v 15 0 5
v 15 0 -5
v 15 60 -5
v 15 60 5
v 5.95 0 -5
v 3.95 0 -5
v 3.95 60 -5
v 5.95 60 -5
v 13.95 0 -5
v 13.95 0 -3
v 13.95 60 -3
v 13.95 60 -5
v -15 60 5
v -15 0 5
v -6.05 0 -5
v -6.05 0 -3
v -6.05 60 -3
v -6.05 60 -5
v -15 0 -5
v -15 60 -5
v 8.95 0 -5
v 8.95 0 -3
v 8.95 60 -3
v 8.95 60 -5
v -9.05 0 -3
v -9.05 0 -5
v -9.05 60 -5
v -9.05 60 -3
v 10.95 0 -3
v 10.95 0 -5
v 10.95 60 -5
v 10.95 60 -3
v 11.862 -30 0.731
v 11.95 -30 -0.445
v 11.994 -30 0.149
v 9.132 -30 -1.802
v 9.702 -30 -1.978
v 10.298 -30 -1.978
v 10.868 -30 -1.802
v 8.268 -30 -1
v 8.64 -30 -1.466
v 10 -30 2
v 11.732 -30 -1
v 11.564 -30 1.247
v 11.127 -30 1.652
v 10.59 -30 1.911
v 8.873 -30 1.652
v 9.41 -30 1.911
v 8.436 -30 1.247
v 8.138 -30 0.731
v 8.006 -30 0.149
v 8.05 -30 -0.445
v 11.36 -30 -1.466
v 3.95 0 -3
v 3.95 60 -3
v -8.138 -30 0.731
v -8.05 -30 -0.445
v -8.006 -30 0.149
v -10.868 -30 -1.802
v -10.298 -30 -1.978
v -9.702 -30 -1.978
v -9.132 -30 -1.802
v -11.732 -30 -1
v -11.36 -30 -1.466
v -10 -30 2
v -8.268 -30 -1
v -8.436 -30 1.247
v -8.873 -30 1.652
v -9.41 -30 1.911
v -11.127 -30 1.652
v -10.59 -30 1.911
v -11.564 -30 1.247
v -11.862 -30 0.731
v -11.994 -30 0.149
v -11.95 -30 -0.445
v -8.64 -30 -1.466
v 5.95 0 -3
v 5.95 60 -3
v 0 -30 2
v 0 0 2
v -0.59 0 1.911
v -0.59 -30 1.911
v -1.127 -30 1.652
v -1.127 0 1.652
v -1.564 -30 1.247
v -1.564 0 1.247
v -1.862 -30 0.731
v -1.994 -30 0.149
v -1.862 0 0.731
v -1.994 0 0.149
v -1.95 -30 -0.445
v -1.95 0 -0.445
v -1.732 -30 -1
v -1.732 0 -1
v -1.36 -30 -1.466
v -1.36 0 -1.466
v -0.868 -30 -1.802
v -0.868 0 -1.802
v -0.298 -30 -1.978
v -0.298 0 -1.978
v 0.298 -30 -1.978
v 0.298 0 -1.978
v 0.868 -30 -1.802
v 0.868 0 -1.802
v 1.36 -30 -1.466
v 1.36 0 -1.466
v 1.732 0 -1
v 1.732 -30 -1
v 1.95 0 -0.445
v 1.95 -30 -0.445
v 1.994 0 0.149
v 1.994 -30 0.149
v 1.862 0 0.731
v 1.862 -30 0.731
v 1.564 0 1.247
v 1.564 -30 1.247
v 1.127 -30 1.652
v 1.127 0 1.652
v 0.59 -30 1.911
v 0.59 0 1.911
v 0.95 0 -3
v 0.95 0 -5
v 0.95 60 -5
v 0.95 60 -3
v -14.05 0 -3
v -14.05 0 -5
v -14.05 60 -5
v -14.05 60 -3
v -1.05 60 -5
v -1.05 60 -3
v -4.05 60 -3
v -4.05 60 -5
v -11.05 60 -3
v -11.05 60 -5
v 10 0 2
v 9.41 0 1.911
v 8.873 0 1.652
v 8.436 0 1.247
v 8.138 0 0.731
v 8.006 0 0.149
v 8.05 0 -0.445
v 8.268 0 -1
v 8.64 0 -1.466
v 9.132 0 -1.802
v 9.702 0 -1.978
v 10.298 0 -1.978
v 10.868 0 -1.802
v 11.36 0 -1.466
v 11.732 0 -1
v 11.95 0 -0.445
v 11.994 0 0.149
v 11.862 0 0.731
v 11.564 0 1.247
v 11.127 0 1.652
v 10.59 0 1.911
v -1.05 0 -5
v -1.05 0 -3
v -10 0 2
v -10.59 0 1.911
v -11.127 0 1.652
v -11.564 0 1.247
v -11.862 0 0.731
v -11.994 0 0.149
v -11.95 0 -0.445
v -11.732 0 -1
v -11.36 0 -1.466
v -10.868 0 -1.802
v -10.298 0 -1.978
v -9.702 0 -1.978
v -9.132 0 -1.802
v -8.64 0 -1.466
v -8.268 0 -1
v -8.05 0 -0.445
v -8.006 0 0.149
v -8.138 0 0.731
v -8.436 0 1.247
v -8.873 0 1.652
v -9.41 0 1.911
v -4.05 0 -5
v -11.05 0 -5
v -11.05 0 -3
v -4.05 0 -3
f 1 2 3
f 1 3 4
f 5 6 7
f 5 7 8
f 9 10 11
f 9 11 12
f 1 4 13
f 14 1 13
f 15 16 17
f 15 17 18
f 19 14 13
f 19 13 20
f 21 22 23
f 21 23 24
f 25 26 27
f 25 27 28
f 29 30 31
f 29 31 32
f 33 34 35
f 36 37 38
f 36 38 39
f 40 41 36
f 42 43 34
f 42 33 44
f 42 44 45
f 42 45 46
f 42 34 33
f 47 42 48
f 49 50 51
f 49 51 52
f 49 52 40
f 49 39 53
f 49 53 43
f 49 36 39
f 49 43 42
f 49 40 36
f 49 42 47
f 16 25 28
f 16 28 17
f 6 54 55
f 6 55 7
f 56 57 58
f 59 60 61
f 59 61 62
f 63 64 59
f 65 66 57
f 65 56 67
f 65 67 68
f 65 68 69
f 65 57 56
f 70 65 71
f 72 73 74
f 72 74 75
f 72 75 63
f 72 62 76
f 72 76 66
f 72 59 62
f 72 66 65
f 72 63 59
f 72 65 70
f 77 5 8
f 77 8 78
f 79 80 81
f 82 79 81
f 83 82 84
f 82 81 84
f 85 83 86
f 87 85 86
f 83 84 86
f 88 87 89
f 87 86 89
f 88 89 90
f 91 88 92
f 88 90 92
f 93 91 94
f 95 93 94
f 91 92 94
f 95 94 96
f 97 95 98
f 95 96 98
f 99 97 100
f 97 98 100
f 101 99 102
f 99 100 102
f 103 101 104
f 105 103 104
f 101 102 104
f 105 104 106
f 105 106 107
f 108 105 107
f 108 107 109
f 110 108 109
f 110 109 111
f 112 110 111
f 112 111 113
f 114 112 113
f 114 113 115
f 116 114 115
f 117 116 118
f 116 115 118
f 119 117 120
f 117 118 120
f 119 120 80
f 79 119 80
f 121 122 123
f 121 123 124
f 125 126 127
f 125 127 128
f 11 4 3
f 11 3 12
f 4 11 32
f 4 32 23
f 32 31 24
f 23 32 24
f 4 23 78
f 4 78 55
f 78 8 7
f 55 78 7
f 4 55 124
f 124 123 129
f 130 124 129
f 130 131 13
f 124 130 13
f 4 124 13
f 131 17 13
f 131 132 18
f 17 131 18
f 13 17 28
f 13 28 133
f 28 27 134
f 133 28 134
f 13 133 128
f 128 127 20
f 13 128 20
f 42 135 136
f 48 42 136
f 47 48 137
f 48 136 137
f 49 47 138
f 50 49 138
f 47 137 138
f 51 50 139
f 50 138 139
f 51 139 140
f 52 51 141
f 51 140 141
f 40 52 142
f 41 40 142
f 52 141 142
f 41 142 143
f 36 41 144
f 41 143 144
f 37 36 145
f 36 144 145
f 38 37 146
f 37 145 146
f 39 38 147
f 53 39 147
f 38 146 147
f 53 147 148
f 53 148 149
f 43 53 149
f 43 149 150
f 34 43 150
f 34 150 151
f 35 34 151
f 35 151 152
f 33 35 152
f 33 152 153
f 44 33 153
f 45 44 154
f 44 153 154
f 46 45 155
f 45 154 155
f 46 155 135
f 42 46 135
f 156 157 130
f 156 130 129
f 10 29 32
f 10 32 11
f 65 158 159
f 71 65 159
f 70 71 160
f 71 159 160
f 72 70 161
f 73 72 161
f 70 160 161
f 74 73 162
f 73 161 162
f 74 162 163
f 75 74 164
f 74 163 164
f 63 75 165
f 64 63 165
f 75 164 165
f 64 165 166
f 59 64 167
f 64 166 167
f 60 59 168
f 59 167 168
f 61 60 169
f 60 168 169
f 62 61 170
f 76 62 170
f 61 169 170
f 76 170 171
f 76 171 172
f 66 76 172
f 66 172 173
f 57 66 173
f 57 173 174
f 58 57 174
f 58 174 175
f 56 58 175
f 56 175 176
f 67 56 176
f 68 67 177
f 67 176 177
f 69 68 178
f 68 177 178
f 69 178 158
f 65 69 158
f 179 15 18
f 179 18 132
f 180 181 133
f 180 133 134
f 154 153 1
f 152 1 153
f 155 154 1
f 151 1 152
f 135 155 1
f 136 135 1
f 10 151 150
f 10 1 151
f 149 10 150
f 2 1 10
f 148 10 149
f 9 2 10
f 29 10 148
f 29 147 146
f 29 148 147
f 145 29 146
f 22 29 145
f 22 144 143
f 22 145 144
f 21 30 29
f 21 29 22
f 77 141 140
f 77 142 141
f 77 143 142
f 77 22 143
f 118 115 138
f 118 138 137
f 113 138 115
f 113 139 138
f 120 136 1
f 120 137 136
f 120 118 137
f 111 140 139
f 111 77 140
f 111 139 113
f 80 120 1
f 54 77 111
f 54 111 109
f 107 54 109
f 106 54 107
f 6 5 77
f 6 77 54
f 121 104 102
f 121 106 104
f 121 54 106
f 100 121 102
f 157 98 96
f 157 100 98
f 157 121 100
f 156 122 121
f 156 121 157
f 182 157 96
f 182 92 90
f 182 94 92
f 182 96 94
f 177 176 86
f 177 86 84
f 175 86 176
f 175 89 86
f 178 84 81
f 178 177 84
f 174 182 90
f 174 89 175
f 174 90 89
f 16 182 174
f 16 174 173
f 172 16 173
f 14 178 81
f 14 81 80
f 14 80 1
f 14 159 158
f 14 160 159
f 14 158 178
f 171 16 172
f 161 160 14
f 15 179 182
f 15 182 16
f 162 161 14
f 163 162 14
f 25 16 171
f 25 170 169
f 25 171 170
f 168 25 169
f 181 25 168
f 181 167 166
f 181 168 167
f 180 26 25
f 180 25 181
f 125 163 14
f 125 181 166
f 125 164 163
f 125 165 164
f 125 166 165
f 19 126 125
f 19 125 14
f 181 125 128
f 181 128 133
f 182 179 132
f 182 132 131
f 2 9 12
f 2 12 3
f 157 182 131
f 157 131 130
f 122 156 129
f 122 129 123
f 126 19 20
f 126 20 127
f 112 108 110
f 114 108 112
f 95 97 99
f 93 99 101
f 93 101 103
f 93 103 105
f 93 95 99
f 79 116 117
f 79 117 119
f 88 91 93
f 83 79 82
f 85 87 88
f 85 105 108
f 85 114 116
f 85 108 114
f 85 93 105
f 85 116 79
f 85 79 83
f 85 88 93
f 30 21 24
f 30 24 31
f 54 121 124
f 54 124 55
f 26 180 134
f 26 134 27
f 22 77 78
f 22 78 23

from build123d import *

# Parameters (mm, degrees)
BOSS_EXTRUDE1_DEPTH = 60
SKETCH2_R           = 2
BOSS_EXTRUDE2_DEPTH = 30


with BuildPart() as part:
    # Sketch1 → Boss-Extrude1 (new body)
    with BuildSketch(Plane(origin=(0, 0, 0), x_dir=(1, 0, 0), z_dir=(0, 1, 0))):
        Polygon((-15, 5), (-14.049599683, 5), (-14.049599683, 3), (-11.049599683, 3), (-11.049599683, 5), (-9.049599683, 5), (-9.049599683, 3), (-6.049599683, 3), (-6.049599683, 5), (-4.049599683, 5), (-4.049599683, 3), (-1.049599683, 3), (-1.049599683, 5), (0.950400317, 5), (0.950400317, 3), (3.950400317, 3), (3.950400317, 5), (5.950400317, 5), (5.950400317, 3), (8.950400317, 3), (8.950400317, 5), (10.950400317, 5), (10.950400317, 3), (13.950400317, 3), (13.950400317, 5), (15, 5), (15, -5), (-15, -5), align=None)
    extrude(amount=BOSS_EXTRUDE1_DEPTH)

    # Sketch2 → Boss-Extrude2 (add)
    with BuildSketch(Plane.XZ):
        with Locations(Location((0, 0, 0), (0, 0, 90))):
            Circle(SKETCH2_R)
        with Locations(Location((10, 0, 0), (0, 0, 90))):
            Circle(SKETCH2_R)
        with Locations(Location((-10, 0, 0), (0, 0, 90))):
            Circle(SKETCH2_R)
    extrude(amount=BOSS_EXTRUDE2_DEPTH)


solid = part.part
